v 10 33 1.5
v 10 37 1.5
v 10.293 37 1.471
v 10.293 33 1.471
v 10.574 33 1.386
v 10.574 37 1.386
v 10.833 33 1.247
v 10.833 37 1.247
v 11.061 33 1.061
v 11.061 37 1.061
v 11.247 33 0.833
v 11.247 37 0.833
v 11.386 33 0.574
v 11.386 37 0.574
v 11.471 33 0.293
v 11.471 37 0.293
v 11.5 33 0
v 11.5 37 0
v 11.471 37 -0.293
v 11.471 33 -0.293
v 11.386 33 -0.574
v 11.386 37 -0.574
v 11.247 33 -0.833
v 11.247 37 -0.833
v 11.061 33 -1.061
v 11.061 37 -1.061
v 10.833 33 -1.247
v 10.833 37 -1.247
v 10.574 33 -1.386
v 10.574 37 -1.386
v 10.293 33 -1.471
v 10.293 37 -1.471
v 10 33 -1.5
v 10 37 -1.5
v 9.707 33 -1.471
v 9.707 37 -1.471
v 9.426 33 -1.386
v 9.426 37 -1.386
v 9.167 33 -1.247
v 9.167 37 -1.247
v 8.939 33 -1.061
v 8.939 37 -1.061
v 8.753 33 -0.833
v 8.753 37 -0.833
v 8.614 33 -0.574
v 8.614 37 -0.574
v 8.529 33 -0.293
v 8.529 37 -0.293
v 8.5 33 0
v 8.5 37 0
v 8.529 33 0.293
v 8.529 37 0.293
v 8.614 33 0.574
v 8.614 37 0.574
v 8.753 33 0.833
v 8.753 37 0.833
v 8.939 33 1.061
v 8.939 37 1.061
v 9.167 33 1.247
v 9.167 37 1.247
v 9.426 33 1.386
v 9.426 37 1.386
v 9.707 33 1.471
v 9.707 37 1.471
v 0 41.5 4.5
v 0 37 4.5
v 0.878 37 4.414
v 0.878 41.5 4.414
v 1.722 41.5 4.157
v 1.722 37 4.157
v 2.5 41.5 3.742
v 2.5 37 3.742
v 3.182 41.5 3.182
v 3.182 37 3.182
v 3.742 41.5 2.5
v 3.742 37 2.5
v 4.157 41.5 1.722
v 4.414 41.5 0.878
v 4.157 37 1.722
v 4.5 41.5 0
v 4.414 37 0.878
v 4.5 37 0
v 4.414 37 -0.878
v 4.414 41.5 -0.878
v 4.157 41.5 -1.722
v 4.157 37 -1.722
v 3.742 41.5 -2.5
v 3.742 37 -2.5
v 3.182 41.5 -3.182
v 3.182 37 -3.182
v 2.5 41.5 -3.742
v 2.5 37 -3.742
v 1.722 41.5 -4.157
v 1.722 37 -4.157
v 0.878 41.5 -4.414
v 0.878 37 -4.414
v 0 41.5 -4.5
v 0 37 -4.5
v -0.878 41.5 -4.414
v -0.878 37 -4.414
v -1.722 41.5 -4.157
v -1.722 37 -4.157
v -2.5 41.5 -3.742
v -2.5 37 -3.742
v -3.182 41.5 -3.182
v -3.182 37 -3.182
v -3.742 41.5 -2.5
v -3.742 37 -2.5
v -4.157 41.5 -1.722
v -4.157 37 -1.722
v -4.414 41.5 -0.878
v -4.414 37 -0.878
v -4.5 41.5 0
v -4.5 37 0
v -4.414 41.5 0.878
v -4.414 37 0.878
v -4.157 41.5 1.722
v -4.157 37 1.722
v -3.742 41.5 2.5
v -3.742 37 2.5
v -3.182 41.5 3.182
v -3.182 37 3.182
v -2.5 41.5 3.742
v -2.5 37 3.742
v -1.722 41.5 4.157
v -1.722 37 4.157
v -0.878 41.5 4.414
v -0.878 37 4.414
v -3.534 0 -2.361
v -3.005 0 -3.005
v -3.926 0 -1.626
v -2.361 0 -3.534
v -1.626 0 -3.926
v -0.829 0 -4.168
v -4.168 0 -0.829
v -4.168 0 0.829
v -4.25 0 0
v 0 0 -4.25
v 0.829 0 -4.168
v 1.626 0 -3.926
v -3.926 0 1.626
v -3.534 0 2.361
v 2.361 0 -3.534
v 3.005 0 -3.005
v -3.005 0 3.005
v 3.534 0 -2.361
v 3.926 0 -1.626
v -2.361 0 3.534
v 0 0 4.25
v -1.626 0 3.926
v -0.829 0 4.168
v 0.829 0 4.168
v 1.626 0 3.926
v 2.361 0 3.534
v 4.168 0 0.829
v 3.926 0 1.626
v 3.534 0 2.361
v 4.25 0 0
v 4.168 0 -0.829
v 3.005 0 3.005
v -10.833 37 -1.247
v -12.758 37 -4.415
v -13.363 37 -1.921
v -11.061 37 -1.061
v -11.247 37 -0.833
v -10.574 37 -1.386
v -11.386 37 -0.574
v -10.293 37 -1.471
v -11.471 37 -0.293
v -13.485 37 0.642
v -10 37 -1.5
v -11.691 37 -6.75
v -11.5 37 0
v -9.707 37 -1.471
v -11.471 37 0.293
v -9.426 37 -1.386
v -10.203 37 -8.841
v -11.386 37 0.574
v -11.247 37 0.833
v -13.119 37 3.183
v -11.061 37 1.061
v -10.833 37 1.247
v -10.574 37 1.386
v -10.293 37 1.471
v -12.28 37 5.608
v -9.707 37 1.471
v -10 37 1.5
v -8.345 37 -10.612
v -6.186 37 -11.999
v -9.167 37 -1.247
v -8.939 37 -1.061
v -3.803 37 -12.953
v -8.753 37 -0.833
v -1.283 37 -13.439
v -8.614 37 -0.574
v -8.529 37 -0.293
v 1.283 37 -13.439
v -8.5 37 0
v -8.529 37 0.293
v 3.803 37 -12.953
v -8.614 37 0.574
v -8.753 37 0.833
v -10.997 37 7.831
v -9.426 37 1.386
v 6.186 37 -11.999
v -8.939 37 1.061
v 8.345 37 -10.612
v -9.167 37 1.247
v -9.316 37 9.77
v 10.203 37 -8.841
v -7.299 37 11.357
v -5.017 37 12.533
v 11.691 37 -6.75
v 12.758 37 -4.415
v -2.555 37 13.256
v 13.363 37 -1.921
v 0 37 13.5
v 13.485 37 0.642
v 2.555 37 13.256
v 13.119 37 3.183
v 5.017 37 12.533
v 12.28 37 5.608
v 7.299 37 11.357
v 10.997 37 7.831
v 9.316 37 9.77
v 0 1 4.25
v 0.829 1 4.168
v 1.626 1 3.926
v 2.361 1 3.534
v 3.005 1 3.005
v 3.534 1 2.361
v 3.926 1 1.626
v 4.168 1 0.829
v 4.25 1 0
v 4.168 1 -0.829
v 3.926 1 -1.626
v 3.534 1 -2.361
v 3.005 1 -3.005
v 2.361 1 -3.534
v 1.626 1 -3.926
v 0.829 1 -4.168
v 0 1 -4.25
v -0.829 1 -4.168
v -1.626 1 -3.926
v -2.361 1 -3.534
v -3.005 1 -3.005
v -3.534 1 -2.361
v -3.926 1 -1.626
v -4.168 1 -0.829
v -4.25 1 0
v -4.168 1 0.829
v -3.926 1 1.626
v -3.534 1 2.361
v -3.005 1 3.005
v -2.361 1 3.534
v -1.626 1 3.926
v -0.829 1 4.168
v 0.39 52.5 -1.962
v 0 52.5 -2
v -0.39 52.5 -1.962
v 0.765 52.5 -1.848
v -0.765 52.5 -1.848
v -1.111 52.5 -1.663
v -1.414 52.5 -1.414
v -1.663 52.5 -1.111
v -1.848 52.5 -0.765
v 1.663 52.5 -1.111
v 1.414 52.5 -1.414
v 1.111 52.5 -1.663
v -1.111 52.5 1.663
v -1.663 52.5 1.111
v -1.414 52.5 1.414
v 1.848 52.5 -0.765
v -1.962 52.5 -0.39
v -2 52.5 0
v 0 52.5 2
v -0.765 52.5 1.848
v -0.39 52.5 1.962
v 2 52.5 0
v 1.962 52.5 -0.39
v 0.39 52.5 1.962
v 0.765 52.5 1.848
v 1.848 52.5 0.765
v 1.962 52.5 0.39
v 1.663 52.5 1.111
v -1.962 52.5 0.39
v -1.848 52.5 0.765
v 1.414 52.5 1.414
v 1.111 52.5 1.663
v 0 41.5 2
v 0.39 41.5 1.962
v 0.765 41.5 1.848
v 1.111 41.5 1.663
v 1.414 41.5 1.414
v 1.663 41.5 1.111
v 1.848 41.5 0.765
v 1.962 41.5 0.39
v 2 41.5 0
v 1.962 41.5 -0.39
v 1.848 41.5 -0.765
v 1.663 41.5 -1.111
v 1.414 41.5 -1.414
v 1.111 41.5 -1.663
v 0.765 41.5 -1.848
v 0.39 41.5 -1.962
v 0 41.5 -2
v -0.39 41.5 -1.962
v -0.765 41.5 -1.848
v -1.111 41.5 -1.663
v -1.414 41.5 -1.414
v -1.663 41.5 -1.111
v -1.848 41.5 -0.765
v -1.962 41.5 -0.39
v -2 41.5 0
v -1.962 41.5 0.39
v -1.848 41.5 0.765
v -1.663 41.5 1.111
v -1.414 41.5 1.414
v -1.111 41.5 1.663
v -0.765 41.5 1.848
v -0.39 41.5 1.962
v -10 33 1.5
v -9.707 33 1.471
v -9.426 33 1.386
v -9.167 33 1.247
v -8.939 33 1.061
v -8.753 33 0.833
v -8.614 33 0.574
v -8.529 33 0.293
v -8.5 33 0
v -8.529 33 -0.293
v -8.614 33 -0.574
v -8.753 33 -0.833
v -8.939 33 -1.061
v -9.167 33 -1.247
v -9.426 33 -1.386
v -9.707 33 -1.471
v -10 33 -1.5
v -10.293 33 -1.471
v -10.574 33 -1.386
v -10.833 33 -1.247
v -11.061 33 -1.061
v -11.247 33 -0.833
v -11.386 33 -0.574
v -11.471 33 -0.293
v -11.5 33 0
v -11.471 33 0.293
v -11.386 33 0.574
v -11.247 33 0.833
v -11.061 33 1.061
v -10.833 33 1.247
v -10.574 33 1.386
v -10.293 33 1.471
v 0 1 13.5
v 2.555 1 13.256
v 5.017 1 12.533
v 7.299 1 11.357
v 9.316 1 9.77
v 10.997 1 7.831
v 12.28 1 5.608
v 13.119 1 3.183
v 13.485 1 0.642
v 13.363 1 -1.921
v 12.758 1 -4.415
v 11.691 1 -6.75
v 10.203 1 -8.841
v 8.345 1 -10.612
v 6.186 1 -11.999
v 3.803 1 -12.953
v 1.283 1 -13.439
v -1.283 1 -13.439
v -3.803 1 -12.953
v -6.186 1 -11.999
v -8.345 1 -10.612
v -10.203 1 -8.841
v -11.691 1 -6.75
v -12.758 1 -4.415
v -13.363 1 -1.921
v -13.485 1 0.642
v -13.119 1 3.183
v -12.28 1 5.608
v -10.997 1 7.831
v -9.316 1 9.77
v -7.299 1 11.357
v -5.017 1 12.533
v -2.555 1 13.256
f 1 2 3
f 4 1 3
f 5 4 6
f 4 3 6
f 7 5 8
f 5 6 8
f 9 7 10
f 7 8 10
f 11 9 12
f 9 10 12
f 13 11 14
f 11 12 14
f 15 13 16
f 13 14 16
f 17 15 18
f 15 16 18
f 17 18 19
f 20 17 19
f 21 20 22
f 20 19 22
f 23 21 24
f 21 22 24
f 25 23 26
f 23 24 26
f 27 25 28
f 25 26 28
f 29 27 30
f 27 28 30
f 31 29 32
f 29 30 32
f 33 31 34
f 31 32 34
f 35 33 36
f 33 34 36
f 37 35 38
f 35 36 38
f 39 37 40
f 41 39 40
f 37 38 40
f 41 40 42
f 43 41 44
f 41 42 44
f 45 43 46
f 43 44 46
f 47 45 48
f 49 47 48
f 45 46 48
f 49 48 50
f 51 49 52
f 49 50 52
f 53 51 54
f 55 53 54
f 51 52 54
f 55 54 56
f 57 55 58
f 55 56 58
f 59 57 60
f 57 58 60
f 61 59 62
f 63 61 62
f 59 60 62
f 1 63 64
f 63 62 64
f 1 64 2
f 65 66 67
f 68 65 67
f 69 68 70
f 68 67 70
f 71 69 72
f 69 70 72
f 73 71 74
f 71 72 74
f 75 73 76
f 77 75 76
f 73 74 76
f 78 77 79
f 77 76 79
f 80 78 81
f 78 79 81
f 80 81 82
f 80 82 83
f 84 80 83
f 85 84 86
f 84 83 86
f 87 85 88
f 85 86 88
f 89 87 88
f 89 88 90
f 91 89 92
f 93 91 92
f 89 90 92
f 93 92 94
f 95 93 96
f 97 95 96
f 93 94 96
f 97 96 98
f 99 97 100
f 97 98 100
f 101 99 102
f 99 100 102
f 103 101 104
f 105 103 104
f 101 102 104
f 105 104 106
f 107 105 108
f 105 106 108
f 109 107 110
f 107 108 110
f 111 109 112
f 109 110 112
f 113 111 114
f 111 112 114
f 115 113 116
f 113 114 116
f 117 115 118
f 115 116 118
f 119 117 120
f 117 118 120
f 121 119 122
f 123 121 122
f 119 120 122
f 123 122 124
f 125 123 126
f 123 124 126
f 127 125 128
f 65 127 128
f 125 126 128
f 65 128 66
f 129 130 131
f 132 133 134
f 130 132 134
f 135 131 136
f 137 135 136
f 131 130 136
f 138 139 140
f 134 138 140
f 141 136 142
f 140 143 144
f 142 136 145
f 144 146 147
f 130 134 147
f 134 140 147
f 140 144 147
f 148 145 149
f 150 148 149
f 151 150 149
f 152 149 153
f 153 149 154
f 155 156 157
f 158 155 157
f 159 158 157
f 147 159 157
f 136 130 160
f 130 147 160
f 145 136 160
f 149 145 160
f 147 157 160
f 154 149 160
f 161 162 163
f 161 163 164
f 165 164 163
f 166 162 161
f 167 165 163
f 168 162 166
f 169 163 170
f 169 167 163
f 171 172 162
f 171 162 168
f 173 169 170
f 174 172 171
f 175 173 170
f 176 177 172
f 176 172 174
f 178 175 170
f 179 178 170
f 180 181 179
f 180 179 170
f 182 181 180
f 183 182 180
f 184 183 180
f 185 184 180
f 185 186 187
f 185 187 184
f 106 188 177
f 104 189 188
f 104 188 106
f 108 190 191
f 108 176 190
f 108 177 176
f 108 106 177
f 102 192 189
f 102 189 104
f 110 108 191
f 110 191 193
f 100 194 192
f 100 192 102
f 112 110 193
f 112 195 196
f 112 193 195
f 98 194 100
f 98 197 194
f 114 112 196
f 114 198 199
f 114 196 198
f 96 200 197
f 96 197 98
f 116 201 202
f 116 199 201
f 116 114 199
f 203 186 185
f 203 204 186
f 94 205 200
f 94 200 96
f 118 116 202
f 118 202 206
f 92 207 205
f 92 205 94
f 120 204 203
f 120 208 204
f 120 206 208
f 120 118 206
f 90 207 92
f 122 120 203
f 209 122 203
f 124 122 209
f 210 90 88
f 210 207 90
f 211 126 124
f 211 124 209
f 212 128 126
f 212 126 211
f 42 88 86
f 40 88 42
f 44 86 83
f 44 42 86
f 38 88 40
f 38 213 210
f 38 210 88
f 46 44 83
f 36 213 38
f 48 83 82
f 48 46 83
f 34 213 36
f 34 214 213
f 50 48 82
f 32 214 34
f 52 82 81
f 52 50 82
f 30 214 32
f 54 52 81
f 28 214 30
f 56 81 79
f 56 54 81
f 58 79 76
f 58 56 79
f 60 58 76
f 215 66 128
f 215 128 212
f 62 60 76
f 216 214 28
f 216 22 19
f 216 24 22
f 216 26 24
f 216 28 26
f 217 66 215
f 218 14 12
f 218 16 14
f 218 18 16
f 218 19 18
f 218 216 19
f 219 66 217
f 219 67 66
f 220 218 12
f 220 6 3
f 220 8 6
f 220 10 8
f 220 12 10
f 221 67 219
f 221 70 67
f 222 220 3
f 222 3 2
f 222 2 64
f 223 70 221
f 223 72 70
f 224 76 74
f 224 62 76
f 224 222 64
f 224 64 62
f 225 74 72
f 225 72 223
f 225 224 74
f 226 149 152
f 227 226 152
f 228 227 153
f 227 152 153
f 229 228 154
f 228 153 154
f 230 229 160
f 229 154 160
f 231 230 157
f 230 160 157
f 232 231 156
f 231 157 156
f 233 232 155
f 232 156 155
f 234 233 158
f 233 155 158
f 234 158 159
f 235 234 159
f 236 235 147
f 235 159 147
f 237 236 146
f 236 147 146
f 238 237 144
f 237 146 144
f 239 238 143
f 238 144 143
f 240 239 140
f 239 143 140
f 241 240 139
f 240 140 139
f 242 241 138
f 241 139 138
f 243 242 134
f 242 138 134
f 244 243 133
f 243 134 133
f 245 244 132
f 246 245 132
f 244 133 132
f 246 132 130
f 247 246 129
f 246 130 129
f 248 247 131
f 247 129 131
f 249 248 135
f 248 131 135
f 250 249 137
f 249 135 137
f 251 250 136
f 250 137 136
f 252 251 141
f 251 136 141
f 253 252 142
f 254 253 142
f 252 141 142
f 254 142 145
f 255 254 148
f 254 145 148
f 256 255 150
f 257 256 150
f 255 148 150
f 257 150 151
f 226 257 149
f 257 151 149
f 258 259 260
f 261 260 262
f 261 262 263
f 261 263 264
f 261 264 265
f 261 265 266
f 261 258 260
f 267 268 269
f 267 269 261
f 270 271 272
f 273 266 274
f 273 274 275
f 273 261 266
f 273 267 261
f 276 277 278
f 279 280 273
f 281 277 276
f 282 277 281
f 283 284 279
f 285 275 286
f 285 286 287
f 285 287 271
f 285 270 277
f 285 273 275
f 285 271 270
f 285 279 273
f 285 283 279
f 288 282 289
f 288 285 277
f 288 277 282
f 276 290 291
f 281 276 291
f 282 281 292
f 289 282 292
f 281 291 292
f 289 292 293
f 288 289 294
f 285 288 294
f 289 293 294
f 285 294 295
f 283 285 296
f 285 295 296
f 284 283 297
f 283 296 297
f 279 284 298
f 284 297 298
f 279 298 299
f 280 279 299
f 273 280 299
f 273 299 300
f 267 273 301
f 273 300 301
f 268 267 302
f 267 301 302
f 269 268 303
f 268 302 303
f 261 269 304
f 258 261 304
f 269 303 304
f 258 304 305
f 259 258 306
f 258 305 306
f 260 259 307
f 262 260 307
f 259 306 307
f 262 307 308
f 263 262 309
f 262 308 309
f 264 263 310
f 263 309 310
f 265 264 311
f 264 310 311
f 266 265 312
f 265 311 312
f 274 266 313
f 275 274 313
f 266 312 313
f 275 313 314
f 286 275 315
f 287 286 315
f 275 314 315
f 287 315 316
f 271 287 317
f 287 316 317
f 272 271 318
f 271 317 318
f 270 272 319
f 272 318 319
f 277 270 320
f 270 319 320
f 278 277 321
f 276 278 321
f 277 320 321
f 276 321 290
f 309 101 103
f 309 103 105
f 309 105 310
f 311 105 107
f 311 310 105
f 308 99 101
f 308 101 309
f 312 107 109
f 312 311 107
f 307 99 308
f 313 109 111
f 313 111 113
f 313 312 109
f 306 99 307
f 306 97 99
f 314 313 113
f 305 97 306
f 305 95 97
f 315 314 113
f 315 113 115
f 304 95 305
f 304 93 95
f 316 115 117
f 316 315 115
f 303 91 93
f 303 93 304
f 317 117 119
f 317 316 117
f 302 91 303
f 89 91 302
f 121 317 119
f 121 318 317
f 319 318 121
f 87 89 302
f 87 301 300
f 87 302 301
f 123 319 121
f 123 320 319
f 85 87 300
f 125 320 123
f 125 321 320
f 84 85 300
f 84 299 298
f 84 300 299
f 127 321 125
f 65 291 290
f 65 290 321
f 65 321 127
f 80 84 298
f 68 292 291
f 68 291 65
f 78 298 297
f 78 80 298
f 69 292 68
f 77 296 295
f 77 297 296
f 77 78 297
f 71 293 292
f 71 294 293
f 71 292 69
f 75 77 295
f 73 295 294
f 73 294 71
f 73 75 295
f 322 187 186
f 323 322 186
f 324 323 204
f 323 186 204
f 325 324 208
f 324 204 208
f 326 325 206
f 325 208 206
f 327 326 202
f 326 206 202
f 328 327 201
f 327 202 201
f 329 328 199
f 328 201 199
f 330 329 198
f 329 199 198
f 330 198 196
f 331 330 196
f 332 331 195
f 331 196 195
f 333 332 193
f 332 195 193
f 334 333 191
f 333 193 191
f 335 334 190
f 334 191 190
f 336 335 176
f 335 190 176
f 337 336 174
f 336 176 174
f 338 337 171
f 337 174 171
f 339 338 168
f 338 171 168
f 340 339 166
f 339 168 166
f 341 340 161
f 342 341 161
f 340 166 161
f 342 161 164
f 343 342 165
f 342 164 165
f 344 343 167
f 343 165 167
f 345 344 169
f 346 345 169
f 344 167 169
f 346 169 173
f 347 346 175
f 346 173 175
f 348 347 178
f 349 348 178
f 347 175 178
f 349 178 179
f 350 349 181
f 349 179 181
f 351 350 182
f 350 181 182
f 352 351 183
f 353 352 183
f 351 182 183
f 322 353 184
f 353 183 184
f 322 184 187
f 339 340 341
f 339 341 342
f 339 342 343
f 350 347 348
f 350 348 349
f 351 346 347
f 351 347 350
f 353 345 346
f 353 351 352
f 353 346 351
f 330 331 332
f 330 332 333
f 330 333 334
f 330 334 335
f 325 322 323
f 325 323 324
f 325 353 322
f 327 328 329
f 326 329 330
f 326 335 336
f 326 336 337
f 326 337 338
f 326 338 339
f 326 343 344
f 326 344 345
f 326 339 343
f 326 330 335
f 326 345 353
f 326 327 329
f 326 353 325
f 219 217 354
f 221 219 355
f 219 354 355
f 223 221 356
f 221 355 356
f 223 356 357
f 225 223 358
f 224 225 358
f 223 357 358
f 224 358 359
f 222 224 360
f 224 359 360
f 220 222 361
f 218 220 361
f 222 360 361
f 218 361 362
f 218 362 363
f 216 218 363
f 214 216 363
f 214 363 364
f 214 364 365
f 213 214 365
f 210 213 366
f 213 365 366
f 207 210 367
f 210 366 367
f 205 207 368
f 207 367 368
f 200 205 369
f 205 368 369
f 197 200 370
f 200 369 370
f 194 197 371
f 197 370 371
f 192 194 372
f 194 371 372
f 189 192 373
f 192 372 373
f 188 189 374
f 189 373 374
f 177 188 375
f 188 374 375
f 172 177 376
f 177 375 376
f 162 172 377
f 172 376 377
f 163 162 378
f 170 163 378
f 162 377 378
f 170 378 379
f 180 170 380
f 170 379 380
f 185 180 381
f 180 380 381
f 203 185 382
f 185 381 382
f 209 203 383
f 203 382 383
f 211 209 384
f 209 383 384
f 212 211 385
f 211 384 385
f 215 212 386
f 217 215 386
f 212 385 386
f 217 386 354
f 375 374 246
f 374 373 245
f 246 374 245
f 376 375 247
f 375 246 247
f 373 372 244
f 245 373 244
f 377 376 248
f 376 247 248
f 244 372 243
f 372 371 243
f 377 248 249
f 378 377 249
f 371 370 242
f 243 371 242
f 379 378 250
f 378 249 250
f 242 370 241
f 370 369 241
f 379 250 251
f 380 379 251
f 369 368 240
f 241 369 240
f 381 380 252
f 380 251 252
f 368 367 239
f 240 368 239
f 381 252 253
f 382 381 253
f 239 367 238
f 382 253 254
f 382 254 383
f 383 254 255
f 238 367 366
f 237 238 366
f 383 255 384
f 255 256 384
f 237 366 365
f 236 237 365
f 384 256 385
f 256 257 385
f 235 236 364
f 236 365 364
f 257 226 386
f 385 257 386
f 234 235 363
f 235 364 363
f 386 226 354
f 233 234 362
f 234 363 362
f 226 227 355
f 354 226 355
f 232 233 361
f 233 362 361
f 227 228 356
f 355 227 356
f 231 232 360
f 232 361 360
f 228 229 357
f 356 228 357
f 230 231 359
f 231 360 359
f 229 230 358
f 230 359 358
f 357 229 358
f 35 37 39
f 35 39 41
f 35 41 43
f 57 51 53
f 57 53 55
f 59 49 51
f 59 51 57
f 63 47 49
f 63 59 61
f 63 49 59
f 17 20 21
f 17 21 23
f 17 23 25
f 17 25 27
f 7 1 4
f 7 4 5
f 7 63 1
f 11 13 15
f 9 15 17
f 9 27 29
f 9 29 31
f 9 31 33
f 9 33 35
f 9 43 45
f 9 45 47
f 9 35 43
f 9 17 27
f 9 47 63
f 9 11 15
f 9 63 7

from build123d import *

# Parameters (mm, degrees)
ESQUISSE1_R      = 4.25
EXTRUSION1_DEPTH = 1
ESQUISSE2_R      = 13.5
EXTRUSION2_DEPTH = 36
ESQUISSE3_R      = 4.5
EXTRUSION3_DEPTH = 4.5
ESQUISSE4_R      = 2
EXTRUSION4_DEPTH = 11
ESQUISSE5_R      = 1.5
EXTRUSION5_DEPTH = 4


with BuildPart() as part:
    # Esquisse1 → Extrusion1 (new body)
    with BuildSketch(Plane(origin=(0, 0, 0), x_dir=(1, 0, 0), z_dir=(0, 1, 0))):
        with Locations(Location((0, 0, 0), (0, 0, 270))):
            Circle(ESQUISSE1_R)
    extrude(amount=EXTRUSION1_DEPTH)

    # Esquisse2 → Extrusion2 (add)
    with BuildSketch(Plane(origin=(0, 1, 0), x_dir=(-1, 0, 0), z_dir=(0, 1, 0))):
        with Locations(Location((0, 0, 0), (0, 0, 90))):
            Circle(ESQUISSE2_R)
    extrude(amount=EXTRUSION2_DEPTH)

    # Esquisse3 → Extrusion3 (add)
    with BuildSketch(Plane(origin=(0, 37, 0), x_dir=(-1, 0, 0), z_dir=(0, 1, 0))):
        with Locations(Location((0, 0, 0), (0, 0, 90))):
            Circle(ESQUISSE3_R)
    extrude(amount=EXTRUSION3_DEPTH)

    # Esquisse4 → Extrusion4 (add)
    with BuildSketch(Plane(origin=(0, 41.5, 0), x_dir=(-1, 0, 0), z_dir=(0, 1, 0))):
        with Locations(Location((0, 0, 0), (0, 0, 90))):
            Circle(ESQUISSE4_R)
    extrude(amount=EXTRUSION4_DEPTH)

    # Esquisse5 → Extrusion5 (cut)
    with BuildSketch(Plane(origin=(0, 37, 0), x_dir=(1, 0, 0), z_dir=(0, 1, 0))):
        with Locations(Location((10, 0, 0), (0, 0, 270))):
            Circle(ESQUISSE5_R)
        with Locations(Location((-10, 0, 0), (0, 0, 270))):
            Circle(ESQUISSE5_R)
    extrude(amount=-EXTRUSION5_DEPTH, mode=Mode.SUBTRACT)


solid = part.part
